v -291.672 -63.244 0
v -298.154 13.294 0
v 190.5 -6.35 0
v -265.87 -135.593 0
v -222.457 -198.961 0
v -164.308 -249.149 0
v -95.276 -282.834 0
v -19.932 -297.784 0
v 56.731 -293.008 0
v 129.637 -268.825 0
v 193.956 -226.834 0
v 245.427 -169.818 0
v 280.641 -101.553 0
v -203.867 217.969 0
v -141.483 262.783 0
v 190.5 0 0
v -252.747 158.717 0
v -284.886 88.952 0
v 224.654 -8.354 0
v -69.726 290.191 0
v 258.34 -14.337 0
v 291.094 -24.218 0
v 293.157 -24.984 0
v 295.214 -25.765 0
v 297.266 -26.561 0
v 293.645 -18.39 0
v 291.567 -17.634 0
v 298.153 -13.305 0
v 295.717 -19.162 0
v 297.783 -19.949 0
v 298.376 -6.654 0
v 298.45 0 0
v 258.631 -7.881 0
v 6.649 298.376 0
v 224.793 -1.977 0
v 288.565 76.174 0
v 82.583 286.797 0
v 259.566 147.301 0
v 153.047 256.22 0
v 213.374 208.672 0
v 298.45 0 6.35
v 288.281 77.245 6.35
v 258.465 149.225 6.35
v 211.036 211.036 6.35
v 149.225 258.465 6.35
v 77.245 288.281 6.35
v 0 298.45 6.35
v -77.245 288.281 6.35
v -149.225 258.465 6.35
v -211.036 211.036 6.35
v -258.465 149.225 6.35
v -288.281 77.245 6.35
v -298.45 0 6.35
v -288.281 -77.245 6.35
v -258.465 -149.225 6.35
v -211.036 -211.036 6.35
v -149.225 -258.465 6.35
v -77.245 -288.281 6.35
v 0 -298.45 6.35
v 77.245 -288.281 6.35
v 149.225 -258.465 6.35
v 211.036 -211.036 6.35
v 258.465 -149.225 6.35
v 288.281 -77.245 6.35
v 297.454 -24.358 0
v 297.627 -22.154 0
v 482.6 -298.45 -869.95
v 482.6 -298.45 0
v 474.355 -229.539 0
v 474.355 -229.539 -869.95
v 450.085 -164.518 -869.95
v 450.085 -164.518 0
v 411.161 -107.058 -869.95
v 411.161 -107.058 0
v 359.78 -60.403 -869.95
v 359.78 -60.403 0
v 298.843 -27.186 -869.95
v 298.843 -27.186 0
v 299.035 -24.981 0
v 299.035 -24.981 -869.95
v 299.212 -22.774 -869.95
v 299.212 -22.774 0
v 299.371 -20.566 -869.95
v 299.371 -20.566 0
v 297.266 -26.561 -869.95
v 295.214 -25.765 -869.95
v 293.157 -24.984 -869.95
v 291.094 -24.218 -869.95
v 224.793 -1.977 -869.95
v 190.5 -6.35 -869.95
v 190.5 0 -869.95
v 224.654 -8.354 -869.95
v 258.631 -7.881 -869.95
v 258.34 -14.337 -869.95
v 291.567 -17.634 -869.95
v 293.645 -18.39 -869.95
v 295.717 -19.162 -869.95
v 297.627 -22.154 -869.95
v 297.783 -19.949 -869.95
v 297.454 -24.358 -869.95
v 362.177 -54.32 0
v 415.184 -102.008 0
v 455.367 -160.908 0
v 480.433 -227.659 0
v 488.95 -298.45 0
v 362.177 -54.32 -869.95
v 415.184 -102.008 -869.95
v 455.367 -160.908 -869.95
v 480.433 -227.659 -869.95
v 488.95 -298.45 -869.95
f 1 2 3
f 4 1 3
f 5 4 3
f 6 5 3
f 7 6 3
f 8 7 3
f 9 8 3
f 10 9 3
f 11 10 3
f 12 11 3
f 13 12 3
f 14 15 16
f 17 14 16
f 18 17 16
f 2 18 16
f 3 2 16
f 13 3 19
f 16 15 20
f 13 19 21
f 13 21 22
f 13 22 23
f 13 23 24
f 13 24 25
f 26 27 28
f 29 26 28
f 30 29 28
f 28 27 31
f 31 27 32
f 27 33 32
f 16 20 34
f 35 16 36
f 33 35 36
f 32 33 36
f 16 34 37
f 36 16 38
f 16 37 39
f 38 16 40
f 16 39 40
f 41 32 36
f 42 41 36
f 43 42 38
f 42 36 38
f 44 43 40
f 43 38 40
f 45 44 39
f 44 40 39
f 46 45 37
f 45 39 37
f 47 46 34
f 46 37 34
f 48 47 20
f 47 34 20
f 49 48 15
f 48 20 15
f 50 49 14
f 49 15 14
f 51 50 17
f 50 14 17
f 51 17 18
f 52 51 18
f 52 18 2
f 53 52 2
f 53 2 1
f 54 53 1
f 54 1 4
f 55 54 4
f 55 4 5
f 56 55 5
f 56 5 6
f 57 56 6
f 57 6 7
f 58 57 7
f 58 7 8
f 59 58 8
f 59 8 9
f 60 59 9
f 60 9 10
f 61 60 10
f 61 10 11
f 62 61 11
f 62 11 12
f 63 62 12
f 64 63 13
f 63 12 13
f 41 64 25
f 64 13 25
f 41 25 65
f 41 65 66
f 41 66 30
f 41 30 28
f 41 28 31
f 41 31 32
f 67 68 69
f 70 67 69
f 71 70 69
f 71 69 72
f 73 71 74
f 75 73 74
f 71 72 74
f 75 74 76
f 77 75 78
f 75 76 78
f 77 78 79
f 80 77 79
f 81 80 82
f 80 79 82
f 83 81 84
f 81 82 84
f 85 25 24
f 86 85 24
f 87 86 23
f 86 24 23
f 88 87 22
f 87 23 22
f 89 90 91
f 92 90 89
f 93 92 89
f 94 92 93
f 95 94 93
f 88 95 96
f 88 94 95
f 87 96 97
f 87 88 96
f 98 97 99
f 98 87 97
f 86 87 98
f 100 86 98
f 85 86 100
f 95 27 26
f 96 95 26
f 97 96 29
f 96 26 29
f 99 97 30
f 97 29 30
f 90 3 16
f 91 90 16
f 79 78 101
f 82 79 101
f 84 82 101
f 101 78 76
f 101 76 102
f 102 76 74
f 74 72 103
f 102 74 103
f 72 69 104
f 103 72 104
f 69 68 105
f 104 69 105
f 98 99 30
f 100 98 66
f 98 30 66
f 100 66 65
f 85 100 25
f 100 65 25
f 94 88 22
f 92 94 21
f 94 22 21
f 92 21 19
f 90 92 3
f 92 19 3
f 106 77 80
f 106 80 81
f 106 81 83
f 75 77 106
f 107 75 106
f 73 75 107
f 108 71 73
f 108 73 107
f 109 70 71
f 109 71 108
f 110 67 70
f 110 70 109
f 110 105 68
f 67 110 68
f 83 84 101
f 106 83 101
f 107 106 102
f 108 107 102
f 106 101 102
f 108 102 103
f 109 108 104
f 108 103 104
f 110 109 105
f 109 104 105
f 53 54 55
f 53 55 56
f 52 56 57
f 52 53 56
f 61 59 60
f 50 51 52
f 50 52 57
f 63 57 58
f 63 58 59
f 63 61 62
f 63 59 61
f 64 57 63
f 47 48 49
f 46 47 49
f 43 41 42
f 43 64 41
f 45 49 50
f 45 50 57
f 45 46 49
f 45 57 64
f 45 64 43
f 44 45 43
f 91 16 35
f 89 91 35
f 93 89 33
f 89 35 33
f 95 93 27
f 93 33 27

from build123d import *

# Parameters (mm, degrees)
F0_R     = 298.45
F1_DEPTH = 6.35
F3_DEPTH = 869.95


with BuildPart() as f1:
    # F0 (on Top) → F1 (new body)
    with BuildSketch(Plane.XY):
        Circle(F0_R)
    extrude(amount=F1_DEPTH)

    # F2 (on face) → F3 (join)
    with BuildSketch(Plane(origin=(0, 0, 0), x_dir=(1, 0, 0), z_dir=(0, 0, -1))):
        with BuildLine():
            Line((190.5, 6.3500086406), (190.5, 0))
            ThreePointArc((190.5, 0), (241.7970177433, 4.4414653099), (291.567254285, 17.6336674777))
            ThreePointArc((291.567254285, 17.6336674777), (291.3493839809, 20.9271702332), (291.094311925, 24.218000845))
            ThreePointArc((291.094311925, 24.218000845), (241.5844417046, 10.8516954711), (190.5, 6.3500086406))
        make_face()
        with BuildLine():
            ThreePointArc((291.094311925, 24.218000845), (291.3493839809, 20.9271702332), (291.567254285, 17.6336674777))
            ThreePointArc((291.567254285, 17.6336674777), (294.6813308905, 18.774021779), (297.7825440966, 19.9489080234))
            ThreePointArc((297.7825440967, 19.9489080234), (297.5424958598, 23.2565186022), (297.2657095789, 26.5612576617))
            ThreePointArc((297.2657095789, 26.5612576617), (294.1866304913, 25.3721949525), (291.094311925, 24.218000845))
        make_face()
    extrude(amount=F3_DEPTH)


with BuildPart() as f3:
    # F2 (on face) → F3, piece 2 (new body)
    with BuildSketch(Plane(origin=(0, 0, 0), x_dir=(1, 0, 0), z_dir=(0, 0, -1))):
        with BuildLine():
            ThreePointArc((298.8430011947, 27.1859237858), (299.1255223628, 23.8775142405), (299.3714181585, 20.5661810969))
            ThreePointArc((299.3714181585, 20.5661810969), (437.0411499622, 130.254090789), (488.95, 298.45))
            Line((488.95, 298.45), (482.5999913594, 298.45))
            ThreePointArc((482.5999913594, 298.45), (432.3360960082, 134.6278170708), (298.8430011947, 27.1859237859))
        make_face()
    extrude(amount=F3_DEPTH)


solid = Compound([f1.part, f3.part])
